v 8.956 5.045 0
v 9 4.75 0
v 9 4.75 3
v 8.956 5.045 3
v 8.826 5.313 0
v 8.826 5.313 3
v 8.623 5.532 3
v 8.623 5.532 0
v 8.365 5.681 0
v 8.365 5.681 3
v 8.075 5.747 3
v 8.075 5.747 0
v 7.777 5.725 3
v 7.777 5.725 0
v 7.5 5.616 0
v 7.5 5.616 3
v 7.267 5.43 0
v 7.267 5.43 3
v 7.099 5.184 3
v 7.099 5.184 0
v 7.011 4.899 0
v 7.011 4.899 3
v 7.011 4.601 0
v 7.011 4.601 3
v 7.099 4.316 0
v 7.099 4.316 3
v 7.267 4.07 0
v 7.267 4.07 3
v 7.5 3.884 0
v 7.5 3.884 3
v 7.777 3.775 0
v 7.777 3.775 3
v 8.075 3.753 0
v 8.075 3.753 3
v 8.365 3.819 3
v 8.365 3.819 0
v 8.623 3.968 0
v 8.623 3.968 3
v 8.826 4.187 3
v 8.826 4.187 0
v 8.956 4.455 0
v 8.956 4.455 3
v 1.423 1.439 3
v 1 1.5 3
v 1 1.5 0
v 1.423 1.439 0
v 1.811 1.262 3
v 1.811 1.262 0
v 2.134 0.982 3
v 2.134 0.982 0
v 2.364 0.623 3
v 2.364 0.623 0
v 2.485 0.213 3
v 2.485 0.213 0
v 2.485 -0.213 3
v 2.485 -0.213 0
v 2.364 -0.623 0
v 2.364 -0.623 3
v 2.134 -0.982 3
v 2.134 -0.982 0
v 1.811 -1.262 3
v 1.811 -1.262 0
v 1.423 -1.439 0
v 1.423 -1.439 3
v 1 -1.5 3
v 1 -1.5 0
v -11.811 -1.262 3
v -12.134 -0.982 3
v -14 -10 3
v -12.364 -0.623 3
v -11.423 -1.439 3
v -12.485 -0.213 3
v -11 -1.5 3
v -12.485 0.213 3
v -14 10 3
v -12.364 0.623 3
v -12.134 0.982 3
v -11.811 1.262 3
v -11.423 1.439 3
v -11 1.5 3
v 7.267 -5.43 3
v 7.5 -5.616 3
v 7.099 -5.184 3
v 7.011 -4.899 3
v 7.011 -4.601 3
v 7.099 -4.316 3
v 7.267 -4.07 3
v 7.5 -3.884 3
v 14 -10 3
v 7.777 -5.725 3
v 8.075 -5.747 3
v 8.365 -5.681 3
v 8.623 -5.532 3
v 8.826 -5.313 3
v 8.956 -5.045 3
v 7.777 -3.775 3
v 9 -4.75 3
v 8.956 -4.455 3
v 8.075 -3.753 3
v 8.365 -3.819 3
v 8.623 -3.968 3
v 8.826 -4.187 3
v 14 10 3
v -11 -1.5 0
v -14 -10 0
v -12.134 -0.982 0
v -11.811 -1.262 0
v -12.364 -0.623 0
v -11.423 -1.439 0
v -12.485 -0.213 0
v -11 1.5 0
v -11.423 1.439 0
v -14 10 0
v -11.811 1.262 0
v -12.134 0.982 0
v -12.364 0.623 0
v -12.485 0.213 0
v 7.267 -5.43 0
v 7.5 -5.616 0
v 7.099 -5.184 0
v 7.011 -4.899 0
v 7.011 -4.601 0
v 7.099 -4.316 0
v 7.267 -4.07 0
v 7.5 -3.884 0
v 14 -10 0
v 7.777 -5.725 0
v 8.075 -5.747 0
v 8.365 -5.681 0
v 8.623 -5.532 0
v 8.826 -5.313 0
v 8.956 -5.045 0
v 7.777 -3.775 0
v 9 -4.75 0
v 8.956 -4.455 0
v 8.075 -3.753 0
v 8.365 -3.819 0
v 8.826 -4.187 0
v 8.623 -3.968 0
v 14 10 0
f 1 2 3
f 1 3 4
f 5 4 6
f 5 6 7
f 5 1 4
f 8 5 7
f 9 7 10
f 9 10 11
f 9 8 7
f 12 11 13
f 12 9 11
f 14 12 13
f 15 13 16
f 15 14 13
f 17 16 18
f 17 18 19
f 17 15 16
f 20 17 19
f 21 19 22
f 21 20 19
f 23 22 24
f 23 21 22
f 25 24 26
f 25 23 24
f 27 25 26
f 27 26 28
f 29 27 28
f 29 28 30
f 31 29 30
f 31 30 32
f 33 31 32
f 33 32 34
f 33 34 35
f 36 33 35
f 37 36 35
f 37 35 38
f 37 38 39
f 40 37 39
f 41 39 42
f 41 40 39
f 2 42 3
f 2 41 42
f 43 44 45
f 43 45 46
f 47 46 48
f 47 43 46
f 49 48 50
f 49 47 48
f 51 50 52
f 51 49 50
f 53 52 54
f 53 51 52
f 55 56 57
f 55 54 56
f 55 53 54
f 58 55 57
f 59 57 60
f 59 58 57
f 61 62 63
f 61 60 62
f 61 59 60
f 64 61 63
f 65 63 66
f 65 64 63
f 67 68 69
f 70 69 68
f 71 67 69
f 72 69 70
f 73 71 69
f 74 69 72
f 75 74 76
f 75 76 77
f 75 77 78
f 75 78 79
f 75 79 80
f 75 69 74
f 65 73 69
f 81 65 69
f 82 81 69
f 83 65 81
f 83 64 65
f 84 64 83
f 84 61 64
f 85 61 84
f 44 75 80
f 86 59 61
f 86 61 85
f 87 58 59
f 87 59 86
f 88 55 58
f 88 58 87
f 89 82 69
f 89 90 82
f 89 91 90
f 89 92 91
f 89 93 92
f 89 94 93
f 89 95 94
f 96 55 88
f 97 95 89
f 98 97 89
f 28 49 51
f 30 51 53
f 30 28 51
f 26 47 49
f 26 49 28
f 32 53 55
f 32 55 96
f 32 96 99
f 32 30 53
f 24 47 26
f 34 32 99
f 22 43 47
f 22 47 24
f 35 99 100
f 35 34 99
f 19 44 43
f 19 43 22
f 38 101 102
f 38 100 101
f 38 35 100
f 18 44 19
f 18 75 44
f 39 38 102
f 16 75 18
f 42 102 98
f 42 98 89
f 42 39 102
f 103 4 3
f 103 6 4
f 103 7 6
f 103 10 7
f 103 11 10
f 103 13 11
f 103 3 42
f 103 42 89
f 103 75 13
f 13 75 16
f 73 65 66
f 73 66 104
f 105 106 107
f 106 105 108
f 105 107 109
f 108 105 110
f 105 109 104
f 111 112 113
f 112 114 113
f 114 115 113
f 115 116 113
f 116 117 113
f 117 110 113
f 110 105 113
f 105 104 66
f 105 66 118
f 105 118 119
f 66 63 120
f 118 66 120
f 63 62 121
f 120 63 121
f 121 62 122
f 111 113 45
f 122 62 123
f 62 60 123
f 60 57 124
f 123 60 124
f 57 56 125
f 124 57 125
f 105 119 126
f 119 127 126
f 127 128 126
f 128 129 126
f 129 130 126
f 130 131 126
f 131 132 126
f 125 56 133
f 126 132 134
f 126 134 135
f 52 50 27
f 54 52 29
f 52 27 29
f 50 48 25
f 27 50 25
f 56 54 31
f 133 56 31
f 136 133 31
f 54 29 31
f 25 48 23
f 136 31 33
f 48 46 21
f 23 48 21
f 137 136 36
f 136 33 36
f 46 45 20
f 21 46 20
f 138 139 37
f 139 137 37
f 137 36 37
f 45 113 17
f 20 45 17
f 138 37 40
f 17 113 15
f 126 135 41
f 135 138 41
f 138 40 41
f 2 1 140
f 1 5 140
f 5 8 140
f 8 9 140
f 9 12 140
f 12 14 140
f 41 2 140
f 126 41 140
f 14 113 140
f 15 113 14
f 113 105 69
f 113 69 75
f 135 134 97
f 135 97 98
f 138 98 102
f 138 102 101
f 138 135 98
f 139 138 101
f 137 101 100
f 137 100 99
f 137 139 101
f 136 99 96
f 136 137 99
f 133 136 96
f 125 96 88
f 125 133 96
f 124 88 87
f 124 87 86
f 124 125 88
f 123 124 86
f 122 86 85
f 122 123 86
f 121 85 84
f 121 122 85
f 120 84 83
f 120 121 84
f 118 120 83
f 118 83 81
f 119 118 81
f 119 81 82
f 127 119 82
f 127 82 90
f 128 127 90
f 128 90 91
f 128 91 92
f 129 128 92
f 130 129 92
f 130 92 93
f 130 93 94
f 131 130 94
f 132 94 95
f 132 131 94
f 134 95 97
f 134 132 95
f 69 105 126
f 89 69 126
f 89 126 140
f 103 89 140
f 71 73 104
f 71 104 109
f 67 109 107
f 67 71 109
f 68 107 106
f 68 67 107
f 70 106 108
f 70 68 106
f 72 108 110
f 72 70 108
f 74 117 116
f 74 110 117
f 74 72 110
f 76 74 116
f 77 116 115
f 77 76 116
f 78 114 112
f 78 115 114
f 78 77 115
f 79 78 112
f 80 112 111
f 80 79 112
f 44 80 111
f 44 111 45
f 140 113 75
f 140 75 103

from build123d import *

# Parameters (mm, degrees)
SKETCH_1_W          = 28
SKETCH_1_H          = 20
SKETCH_1_R          = 1
EXTRUDE_1_DEPTH     = 3
CUT_EXTRUDE_1_DEPTH = 4
SKETCH_3_W          = 17.35128085
SKETCH_3_H          = 5.450829119
SKETCH_3_W_2        = 17.701224177
SKETCH_3_H_2        = 5.124932949
EXTRUDE_2_DEPTH     = 3


with BuildPart() as part:
    # 草图1 → 凸台-拉伸1 (new body)
    with BuildSketch(Plane.XY):
        Rectangle(SKETCH_1_W, SKETCH_1_H)
        with Locations((8, 4.75)):
            Circle(SKETCH_1_R, mode=Mode.SUBTRACT)
        with Locations((8, -4.75)):
            Circle(SKETCH_1_R, mode=Mode.SUBTRACT)
        with BuildLine():
            Line((-11, 6.25), (1, 6.25))
            ThreePointArc((1, 6.25), (2.5, 4.75), (1, 3.25))
            Line((1, 3.25), (-11, 3.25))
            ThreePointArc((-11, 3.25), (-12.5, 4.75), (-11, 6.25))
        make_face(mode=Mode.SUBTRACT)
        with BuildLine():
            Line((-11, -6.25), (1, -6.25))
            ThreePointArc((1, -6.25), (2.5, -4.75), (1, -3.25))
            Line((1, -3.25), (-11, -3.25))
            ThreePointArc((-11, -3.25), (-12.5, -4.75), (-11, -6.25))
        make_face(mode=Mode.SUBTRACT)
    extrude(amount=EXTRUDE_1_DEPTH)

    # 草图2 → 切除-拉伸1 (cut, through all)
    with BuildSketch(Plane.XY.offset(3)):
        with BuildLine():
            Line((1, -1.5), (-11, -1.5))
            ThreePointArc((-11, -1.5), (-12.5, 0), (-11, 1.5))
            Line((-11, 1.5), (1, 1.5))
            ThreePointArc((1, 1.5), (2.5, 0), (1, -1.5))
        make_face()
    extrude(amount=-CUT_EXTRUDE_1_DEPTH, mode=Mode.SUBTRACT)

    # 草图3 → 凸台-拉伸2 (add)
    with BuildSketch(Plane.XY.offset(3)):
        with Locations((-4.556899514, 5.212806564)):
            Rectangle(SKETCH_3_W, SKETCH_3_H)
        with Locations((-4.381927851, -5.15844561)):
            Rectangle(SKETCH_3_W_2, SKETCH_3_H_2)
    extrude(amount=-EXTRUDE_2_DEPTH)


solid = part.part
